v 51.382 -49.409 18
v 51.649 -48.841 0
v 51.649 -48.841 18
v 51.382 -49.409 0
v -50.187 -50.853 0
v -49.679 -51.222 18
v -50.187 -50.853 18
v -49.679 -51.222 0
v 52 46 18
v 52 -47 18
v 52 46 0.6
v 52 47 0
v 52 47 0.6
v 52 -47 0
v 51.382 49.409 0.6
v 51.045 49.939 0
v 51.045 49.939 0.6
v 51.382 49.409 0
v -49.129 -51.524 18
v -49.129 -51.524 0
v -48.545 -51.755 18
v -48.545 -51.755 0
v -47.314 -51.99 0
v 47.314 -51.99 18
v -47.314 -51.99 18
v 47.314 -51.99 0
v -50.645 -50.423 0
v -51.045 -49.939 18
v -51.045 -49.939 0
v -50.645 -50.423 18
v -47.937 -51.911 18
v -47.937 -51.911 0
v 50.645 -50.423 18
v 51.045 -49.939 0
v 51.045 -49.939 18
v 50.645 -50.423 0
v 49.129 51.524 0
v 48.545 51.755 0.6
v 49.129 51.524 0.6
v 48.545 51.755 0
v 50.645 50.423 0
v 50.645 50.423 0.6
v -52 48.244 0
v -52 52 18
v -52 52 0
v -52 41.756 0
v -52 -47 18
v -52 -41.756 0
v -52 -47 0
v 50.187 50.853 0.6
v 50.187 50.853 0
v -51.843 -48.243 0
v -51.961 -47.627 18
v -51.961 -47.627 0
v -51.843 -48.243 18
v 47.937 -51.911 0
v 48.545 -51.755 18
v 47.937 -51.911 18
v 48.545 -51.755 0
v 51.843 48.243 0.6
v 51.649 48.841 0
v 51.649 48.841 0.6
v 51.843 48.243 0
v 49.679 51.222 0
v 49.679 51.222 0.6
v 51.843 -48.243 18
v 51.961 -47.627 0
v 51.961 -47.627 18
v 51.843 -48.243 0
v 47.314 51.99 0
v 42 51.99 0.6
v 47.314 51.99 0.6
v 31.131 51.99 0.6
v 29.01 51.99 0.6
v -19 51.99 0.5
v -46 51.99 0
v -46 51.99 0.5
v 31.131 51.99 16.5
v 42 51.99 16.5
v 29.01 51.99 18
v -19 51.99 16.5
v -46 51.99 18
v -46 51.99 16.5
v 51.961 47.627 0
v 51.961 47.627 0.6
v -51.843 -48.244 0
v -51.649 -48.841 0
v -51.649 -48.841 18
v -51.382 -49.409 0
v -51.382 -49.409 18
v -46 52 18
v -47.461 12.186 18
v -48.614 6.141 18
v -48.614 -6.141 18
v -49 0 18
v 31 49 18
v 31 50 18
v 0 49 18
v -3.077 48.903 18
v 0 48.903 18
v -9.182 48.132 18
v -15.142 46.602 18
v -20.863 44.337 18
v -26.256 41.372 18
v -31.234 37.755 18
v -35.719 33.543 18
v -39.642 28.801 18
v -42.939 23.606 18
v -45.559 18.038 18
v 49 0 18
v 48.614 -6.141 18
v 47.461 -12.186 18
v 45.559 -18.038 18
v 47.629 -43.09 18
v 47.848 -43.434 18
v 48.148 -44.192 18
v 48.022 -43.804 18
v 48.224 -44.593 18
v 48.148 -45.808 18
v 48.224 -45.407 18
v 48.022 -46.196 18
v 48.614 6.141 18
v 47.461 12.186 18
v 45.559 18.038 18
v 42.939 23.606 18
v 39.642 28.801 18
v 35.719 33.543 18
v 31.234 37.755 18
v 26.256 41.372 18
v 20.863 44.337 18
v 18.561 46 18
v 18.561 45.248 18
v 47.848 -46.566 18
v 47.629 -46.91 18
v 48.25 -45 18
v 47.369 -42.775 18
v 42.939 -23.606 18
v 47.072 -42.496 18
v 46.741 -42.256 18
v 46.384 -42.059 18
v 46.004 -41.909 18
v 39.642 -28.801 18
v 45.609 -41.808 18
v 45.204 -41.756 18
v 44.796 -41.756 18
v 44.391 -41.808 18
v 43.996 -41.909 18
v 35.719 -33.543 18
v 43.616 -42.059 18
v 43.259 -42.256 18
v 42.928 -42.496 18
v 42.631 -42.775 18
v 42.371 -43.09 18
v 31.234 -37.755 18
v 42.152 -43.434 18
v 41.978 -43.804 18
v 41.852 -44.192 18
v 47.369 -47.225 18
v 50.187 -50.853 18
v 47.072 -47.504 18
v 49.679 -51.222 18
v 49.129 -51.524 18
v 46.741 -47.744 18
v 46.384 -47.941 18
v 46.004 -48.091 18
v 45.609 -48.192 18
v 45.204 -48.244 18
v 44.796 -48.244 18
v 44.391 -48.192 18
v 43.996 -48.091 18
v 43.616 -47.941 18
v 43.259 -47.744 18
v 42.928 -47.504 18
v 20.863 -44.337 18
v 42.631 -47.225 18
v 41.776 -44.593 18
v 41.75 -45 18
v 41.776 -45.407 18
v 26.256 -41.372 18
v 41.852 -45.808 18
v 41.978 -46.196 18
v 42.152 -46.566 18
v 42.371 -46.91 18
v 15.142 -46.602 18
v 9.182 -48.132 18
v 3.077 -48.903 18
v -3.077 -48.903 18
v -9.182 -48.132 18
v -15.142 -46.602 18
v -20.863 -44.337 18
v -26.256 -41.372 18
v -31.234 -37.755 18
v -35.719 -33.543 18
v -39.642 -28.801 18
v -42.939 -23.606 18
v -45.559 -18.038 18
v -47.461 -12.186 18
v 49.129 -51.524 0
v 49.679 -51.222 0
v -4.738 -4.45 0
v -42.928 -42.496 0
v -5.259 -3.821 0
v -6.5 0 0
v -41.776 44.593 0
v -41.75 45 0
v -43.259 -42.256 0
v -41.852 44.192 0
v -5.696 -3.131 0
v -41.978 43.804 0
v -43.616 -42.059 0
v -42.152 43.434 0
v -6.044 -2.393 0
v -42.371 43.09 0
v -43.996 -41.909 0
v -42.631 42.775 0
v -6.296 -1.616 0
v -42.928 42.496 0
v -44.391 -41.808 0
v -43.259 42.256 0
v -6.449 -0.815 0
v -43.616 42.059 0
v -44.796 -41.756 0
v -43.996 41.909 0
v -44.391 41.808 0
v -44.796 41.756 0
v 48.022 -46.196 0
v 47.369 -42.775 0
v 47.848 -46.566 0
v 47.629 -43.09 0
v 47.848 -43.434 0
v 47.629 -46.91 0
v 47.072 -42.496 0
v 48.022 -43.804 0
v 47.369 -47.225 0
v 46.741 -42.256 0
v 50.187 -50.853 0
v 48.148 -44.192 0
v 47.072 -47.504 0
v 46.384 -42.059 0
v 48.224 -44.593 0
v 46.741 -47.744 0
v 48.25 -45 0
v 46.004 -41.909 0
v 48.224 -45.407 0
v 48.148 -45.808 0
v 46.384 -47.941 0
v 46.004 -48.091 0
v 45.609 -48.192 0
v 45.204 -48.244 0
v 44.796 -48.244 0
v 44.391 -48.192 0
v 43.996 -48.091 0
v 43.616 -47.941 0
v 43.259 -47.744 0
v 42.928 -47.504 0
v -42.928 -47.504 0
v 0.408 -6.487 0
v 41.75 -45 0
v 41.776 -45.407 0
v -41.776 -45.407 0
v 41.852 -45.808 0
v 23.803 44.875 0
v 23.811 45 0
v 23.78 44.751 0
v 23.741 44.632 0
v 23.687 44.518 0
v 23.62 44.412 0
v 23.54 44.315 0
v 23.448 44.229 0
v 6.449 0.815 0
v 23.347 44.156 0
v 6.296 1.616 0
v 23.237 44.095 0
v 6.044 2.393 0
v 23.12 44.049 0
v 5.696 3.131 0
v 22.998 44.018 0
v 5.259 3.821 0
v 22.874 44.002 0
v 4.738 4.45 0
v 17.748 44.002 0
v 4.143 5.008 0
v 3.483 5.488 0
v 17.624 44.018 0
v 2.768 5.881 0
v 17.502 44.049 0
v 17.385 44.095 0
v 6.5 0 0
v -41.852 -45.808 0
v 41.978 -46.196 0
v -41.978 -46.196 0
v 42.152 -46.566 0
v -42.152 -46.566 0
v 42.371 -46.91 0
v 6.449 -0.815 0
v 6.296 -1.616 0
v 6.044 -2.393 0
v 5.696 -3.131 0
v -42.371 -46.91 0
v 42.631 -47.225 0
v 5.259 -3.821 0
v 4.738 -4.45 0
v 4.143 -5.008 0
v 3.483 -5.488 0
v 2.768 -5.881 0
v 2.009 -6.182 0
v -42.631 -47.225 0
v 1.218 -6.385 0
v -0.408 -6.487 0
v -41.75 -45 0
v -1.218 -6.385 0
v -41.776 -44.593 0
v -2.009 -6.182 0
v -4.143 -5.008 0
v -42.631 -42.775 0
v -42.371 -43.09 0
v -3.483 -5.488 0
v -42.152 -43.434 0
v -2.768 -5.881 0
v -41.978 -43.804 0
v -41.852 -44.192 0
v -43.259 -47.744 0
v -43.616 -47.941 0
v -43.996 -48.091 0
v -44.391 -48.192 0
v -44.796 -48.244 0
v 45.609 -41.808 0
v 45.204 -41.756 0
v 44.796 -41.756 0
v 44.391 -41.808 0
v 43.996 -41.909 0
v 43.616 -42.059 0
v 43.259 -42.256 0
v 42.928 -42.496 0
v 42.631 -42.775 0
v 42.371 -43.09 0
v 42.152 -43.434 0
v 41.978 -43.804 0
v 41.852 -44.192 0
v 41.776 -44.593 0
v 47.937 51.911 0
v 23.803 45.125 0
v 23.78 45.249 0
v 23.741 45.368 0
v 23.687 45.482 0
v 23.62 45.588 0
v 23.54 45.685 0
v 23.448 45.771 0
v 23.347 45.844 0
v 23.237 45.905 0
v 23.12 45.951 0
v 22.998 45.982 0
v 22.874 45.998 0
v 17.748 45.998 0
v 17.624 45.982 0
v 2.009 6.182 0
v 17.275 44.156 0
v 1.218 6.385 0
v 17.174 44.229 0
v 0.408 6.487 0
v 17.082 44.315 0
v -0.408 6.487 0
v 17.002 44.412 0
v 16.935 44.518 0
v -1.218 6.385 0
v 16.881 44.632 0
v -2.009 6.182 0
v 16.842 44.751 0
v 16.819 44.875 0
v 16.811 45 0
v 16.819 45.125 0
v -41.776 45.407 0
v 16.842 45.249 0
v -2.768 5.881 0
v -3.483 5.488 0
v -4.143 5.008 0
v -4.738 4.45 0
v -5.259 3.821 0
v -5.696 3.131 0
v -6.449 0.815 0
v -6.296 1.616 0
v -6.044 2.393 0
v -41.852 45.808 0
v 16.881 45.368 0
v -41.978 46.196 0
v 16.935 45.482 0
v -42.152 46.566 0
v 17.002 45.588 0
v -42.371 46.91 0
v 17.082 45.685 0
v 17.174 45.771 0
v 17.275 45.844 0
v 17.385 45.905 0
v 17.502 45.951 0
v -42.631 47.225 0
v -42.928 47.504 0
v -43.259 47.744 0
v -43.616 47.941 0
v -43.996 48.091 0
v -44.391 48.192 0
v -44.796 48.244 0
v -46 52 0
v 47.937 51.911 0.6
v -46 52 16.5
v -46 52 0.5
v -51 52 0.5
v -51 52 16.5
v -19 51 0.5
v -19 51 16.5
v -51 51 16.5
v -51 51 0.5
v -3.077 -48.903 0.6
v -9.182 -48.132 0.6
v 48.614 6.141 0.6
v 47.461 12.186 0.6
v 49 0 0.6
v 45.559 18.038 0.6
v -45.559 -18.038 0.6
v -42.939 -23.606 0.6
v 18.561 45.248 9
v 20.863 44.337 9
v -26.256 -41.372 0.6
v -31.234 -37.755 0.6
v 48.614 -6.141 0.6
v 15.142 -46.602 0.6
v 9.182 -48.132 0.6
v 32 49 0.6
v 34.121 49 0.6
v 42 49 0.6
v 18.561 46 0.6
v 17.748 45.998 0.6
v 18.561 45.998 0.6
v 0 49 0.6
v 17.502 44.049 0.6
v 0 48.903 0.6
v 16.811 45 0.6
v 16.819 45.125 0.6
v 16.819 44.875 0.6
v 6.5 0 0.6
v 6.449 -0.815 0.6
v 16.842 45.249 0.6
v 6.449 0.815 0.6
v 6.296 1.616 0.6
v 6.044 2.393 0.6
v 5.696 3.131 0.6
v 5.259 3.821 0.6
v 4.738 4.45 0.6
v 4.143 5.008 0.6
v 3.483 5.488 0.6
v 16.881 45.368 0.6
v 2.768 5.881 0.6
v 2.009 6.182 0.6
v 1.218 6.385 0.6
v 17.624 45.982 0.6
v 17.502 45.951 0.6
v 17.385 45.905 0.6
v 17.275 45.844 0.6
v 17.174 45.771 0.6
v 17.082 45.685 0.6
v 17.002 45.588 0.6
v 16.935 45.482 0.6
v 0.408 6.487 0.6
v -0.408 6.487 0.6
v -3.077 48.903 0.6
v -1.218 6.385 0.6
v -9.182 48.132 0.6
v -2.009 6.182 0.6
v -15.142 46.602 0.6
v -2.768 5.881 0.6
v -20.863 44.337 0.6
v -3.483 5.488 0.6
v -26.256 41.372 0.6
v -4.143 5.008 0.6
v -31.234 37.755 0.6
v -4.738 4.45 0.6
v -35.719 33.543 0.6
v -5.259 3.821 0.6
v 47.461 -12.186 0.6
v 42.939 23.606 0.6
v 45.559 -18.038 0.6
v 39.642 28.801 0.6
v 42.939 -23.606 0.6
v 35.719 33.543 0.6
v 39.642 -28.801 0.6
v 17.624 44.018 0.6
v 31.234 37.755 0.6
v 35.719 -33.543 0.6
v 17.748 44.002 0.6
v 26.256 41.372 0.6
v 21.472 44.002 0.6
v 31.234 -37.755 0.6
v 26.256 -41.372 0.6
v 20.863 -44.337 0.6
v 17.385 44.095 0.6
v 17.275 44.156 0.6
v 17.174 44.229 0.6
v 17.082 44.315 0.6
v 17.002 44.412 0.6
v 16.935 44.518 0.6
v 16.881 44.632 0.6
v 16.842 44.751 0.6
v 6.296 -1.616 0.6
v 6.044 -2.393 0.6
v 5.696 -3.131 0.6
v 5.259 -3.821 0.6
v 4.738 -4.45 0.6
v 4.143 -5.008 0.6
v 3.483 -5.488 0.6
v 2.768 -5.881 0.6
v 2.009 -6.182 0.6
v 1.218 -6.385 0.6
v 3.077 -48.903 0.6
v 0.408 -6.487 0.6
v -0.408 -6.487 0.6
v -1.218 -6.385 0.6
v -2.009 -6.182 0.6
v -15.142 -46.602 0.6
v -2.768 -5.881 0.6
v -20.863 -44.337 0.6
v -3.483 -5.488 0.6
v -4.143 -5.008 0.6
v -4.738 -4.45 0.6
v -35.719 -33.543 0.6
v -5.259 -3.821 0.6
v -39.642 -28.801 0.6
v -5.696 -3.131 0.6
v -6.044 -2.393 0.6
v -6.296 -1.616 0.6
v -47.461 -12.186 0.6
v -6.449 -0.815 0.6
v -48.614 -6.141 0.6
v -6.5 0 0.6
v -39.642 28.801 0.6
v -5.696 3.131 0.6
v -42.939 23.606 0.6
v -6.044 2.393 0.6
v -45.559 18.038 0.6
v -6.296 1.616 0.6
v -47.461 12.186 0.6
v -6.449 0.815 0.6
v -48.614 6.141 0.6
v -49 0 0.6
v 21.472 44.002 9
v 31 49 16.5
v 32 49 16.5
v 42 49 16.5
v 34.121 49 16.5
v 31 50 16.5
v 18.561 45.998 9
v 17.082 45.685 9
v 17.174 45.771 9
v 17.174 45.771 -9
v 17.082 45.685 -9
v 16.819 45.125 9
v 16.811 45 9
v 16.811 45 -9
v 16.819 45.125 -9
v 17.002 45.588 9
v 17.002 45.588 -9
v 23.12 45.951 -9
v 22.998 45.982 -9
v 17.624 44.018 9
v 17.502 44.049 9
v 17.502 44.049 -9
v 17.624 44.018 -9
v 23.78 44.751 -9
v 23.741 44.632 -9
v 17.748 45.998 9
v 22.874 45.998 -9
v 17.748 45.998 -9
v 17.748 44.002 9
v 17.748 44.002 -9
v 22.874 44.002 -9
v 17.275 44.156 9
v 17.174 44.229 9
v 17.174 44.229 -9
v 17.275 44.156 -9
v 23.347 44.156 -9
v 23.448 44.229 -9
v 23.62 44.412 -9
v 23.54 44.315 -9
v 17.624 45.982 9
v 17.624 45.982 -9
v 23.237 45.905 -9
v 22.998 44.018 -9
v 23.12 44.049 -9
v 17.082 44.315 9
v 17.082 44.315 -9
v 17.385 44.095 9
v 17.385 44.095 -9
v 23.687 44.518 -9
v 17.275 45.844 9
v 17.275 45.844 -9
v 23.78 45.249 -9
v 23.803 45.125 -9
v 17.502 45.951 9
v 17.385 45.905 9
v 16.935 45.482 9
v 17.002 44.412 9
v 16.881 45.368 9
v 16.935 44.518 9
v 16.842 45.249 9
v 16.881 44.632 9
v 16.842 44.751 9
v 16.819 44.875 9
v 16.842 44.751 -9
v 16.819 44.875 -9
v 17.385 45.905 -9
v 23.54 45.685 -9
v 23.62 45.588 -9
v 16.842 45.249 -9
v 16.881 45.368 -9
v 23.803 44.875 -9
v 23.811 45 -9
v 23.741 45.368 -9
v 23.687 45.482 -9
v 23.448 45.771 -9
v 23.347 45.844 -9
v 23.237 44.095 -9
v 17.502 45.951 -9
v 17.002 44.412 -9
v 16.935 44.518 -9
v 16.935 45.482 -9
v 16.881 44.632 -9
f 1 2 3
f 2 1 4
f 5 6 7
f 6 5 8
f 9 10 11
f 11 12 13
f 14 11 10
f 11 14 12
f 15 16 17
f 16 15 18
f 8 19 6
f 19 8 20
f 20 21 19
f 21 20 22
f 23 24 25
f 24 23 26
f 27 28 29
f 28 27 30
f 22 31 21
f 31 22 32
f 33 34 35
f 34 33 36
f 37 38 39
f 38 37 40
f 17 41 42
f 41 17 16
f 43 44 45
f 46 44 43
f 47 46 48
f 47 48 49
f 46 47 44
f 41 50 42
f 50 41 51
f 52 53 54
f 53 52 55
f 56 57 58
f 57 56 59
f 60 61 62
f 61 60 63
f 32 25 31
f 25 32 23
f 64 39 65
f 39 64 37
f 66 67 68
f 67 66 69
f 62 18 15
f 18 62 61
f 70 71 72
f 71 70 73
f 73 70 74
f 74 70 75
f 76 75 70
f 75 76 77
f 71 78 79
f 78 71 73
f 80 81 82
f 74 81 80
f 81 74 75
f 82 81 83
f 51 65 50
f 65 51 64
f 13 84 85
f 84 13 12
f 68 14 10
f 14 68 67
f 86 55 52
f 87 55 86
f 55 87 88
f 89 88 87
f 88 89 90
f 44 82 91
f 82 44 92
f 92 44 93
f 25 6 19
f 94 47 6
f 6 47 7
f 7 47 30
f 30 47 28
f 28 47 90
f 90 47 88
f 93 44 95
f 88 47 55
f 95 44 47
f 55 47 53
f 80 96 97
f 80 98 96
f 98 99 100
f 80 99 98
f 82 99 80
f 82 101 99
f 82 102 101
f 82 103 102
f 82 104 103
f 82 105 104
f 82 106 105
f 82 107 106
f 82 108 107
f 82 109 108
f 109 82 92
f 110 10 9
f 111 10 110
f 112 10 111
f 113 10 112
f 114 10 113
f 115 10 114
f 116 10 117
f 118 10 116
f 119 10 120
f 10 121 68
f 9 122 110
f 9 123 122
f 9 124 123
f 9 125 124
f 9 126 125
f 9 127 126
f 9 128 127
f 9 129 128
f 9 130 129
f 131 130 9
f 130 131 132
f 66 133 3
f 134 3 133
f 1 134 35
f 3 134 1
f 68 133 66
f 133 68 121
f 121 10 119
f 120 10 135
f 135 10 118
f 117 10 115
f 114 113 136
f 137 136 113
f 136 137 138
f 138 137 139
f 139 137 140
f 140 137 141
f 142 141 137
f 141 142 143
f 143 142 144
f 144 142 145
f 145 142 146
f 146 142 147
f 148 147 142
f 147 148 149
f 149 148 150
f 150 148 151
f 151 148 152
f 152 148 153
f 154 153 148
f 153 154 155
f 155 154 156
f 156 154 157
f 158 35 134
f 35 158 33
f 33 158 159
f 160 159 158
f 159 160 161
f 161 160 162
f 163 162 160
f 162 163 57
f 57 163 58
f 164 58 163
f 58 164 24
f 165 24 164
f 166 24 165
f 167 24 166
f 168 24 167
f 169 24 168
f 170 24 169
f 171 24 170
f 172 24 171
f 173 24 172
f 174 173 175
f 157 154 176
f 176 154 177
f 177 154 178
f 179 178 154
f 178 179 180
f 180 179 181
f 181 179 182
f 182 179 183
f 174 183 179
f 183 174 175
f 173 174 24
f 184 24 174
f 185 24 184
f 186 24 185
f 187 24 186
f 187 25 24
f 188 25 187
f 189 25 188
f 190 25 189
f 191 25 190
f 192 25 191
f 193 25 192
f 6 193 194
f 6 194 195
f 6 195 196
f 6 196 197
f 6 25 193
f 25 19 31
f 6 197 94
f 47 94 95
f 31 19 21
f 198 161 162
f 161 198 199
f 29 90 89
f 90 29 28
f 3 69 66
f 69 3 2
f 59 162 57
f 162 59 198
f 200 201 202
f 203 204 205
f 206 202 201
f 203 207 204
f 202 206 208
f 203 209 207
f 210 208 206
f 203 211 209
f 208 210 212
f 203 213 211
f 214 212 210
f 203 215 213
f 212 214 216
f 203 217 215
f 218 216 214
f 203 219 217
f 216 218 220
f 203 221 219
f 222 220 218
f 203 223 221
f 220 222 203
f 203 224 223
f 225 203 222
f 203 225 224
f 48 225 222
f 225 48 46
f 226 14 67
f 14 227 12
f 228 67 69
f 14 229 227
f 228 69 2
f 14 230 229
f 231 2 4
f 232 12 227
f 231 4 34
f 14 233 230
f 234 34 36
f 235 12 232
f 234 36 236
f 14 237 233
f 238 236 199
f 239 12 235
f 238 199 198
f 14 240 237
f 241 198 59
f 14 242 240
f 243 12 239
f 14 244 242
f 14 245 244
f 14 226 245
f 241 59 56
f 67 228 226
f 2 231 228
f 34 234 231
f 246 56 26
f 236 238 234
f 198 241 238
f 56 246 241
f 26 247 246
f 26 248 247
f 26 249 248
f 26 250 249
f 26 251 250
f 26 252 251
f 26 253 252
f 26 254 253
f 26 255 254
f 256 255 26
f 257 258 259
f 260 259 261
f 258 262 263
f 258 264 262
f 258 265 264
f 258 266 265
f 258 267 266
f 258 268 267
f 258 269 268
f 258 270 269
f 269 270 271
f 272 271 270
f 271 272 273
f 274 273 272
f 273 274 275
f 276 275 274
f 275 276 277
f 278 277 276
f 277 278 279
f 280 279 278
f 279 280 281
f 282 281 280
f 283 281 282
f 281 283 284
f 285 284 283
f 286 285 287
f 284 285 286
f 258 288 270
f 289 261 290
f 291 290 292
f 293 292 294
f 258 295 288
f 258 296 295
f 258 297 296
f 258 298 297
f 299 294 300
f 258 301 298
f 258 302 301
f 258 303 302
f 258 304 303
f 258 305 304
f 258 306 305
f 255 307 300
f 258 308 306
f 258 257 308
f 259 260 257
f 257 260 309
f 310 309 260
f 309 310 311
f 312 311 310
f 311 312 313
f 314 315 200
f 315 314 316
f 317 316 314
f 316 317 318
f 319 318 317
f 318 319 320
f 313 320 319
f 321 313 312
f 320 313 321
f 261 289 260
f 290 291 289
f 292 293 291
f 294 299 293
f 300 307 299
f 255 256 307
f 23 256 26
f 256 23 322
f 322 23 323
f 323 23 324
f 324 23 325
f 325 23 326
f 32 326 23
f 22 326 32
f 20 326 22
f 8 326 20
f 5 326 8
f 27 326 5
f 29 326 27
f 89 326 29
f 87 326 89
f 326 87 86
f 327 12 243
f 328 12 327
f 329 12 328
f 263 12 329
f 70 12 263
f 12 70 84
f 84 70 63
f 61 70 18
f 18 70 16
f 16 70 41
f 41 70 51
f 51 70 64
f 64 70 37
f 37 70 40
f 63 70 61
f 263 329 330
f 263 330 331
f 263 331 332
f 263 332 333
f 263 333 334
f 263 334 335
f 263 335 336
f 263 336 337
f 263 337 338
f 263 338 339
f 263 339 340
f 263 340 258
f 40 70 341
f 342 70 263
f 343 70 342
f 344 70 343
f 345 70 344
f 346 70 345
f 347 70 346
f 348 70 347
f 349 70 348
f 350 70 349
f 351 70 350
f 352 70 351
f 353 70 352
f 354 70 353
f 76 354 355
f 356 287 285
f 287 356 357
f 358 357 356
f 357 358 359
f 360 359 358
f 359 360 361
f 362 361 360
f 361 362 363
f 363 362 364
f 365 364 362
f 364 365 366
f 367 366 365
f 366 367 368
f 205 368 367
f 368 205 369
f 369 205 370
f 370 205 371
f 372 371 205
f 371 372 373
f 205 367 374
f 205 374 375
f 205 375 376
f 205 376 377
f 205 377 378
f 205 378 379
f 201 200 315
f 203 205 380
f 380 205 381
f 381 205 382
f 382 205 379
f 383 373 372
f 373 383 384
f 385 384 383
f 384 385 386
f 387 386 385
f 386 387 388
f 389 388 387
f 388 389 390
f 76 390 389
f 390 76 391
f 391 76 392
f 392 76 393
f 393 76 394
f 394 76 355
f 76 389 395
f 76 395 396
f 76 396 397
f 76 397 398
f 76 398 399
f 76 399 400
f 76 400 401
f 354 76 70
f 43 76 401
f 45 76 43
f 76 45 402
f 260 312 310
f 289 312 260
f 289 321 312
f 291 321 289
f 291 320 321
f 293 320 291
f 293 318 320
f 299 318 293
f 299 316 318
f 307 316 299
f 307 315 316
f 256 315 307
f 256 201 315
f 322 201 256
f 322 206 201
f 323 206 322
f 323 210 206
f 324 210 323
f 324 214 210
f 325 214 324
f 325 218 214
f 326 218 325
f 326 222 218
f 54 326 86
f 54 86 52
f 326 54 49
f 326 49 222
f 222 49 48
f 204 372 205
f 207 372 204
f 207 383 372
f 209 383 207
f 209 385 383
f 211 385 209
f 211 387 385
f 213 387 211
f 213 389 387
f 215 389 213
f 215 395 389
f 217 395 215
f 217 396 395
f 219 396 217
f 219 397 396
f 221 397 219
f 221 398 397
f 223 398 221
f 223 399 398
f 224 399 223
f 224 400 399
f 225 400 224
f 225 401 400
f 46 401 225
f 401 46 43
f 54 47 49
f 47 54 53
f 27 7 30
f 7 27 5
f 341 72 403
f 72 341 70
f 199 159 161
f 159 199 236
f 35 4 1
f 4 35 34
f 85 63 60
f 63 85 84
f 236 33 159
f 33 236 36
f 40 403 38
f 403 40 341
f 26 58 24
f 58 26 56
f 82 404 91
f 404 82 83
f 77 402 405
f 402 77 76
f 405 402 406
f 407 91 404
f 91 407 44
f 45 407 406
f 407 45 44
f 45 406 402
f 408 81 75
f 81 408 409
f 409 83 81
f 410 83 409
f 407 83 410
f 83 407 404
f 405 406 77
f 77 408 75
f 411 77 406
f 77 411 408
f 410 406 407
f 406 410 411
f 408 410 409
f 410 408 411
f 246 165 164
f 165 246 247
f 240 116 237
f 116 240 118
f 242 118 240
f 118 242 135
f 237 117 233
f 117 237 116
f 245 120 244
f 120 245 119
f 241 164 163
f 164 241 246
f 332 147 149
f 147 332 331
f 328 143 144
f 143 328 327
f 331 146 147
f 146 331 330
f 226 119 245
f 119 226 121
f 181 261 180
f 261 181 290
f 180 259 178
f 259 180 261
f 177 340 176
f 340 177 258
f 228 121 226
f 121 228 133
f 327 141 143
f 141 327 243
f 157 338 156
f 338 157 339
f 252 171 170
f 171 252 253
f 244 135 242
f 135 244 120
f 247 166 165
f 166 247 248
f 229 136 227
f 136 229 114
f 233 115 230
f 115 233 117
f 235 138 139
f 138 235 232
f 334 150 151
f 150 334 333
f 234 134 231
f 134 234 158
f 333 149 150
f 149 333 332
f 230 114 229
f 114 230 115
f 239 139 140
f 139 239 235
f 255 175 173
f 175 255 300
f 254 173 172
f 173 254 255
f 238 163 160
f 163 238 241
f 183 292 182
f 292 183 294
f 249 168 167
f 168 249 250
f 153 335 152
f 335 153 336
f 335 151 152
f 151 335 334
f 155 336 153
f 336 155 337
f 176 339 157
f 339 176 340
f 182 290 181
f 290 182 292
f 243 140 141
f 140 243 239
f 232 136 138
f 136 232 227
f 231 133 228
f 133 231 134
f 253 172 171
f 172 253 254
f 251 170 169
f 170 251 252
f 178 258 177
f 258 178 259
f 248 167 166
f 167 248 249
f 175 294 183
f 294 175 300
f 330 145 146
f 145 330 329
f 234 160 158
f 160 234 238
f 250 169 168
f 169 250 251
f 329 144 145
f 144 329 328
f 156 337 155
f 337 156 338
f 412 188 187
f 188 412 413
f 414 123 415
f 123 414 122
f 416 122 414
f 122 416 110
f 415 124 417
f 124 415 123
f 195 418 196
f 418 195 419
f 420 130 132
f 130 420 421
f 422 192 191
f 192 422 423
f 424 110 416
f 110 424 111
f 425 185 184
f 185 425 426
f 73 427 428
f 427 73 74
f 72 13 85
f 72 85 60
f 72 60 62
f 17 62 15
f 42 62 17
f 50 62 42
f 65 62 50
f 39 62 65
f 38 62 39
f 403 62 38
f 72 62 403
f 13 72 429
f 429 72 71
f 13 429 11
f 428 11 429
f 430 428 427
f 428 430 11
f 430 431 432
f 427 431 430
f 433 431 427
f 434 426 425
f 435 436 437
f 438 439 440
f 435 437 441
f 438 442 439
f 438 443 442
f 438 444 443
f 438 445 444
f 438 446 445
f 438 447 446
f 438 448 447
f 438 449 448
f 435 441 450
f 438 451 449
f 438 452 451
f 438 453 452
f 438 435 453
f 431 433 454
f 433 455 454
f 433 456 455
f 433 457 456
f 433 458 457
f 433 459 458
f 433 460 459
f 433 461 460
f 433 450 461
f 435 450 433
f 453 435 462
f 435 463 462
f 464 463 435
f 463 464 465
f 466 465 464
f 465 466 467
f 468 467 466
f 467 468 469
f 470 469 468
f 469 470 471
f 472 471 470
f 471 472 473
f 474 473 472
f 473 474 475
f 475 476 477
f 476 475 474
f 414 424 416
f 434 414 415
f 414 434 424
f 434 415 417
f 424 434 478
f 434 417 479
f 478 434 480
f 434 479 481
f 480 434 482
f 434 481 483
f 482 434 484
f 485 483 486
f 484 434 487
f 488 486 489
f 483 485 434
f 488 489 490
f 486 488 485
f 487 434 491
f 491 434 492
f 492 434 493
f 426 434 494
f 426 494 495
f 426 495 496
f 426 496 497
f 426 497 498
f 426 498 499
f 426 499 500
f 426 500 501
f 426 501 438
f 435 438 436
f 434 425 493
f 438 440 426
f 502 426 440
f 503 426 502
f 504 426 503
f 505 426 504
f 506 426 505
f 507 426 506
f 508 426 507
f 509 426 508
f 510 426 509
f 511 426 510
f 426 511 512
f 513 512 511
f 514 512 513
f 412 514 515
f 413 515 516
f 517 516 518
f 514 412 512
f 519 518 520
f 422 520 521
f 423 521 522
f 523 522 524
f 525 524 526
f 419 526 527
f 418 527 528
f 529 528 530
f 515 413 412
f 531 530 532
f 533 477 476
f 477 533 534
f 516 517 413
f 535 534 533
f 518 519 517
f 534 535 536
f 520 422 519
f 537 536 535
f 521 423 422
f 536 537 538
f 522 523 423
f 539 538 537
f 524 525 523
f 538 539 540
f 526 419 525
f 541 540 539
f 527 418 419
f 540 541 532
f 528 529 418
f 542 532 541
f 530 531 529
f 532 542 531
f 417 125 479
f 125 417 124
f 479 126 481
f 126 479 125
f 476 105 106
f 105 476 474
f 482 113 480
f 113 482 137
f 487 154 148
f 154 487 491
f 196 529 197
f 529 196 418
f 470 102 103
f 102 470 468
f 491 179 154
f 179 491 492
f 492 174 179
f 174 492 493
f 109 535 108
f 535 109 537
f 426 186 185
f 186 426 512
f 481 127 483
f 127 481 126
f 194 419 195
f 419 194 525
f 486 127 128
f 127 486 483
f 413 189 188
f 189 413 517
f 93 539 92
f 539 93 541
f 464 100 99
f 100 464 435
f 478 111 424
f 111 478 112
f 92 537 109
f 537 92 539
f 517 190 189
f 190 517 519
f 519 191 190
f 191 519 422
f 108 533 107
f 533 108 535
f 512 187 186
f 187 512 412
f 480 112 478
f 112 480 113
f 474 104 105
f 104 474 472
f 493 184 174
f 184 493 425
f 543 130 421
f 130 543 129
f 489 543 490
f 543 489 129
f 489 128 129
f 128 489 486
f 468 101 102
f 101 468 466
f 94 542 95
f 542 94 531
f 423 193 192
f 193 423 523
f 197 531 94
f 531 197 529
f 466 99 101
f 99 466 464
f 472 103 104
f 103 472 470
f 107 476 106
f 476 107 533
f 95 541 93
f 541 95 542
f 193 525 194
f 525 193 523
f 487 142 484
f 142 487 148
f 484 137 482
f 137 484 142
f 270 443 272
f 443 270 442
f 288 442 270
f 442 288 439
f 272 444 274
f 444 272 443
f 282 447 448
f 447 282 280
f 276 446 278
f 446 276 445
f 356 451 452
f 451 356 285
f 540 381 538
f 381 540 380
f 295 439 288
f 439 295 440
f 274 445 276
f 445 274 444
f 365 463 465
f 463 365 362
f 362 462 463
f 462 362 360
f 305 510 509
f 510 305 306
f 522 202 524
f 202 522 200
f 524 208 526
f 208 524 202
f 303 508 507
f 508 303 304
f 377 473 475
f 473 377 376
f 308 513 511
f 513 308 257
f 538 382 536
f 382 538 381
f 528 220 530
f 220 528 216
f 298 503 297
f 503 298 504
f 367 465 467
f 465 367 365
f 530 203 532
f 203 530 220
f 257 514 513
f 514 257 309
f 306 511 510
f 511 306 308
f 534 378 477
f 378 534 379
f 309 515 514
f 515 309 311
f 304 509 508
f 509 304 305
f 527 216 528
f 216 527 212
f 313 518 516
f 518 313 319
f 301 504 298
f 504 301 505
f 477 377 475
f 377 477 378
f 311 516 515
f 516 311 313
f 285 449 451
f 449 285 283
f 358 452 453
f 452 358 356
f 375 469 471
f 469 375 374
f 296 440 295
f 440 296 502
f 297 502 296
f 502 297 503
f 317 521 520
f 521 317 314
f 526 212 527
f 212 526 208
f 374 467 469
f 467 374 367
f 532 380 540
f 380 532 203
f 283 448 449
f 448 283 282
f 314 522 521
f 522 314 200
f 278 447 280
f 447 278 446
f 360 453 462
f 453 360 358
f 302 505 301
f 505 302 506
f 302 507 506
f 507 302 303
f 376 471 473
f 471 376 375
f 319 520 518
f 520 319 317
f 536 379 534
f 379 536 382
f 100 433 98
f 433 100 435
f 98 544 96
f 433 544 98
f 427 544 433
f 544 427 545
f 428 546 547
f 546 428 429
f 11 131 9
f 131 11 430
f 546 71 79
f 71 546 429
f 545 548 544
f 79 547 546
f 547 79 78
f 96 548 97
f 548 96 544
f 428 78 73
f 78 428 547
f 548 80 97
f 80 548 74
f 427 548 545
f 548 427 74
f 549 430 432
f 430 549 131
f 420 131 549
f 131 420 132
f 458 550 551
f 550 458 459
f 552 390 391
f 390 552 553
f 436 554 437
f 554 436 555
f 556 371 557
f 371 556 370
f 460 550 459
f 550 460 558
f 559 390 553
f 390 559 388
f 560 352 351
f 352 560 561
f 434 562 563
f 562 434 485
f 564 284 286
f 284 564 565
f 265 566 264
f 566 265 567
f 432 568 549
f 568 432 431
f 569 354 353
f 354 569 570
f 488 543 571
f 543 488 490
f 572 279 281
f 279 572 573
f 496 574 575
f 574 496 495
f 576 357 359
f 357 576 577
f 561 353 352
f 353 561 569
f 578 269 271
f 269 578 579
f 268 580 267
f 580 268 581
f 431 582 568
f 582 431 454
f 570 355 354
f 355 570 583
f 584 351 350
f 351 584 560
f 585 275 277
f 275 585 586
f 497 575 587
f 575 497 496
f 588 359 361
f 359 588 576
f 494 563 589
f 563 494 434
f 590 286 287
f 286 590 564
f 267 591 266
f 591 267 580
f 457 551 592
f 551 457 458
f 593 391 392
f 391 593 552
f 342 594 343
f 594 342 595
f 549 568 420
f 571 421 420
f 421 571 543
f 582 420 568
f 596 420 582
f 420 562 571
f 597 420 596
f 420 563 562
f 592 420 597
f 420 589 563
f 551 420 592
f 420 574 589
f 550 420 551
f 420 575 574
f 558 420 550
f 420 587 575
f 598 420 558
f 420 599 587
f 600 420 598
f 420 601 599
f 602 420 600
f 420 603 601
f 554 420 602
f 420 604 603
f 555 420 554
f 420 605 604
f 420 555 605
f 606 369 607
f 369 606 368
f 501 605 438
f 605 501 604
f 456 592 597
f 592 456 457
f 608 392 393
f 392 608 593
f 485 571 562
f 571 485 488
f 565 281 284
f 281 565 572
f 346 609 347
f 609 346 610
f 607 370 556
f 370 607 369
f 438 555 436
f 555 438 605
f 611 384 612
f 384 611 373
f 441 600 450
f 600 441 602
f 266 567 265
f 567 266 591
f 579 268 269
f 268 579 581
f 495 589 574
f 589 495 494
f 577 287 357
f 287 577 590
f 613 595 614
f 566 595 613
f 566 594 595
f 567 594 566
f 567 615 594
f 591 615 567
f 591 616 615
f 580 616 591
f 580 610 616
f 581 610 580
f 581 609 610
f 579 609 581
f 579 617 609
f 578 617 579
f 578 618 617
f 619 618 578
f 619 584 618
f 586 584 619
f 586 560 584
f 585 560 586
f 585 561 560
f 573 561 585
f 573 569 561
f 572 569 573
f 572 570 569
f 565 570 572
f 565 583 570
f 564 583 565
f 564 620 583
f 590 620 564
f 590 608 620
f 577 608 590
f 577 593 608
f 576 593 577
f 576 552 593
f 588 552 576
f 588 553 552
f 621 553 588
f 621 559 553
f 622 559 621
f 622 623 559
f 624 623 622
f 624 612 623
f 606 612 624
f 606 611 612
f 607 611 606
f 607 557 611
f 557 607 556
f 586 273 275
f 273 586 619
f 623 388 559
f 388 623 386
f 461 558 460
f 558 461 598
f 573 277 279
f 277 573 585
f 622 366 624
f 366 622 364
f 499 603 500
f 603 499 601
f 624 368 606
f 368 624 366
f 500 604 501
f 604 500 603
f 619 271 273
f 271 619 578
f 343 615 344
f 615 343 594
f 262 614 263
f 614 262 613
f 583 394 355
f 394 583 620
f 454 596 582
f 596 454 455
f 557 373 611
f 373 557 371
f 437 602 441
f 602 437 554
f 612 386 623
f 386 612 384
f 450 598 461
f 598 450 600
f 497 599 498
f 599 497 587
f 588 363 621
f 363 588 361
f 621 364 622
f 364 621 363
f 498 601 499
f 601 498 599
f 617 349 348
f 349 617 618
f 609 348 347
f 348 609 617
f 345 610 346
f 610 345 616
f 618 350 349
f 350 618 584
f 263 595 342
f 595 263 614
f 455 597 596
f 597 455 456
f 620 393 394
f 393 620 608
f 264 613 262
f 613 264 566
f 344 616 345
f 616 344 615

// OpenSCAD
$fn = 50;


union() {
	difference() {
		union() {
			hull() {
				translate(v = [-47.0000000000, 47.0000000000, 0]) {
					cylinder(h = 18, r = 5);
				}
				translate(v = [47.0000000000, 47.0000000000, 0]) {
					cylinder(h = 18, r = 5);
				}
				translate(v = [-47.0000000000, -47.0000000000, 0]) {
					cylinder(h = 18, r = 5);
				}
				translate(v = [47.0000000000, -47.0000000000, 0]) {
					cylinder(h = 18, r = 5);
				}
			}
			translate(v = [-52.0000000000, 46.0000000000, 0]) {
				cube(size = [6, 6, 18]);
			}
		}
		union() {
			translate(v = [-52.5000000000, -45.0000000000, -250.0000000000]) {
				rotate(a = [0, 0, 0]) {
					difference() {
						union() {
							hull() {
								translate(v = [7.5000000000, 0, 0]) {
									cylinder(h = 250, r = 3.2500000000, r1 = 3.2500000000, r2 = 3.2500000000);
								}
								translate(v = [-7.5000000000, 0, 0]) {
									cylinder(h = 250, r = 3.2500000000, r1 = 3.2500000000, r2 = 3.2500000000);
								}
							}
						}
						union();
					}
				}
			}
			translate(v = [-52.5000000000, 45.0000000000, -250.0000000000]) {
				rotate(a = [0, 0, 0]) {
					difference() {
						union() {
							hull() {
								translate(v = [7.5000000000, 0, 0]) {
									cylinder(h = 250, r = 3.2500000000, r1 = 3.2500000000, r2 = 3.2500000000);
								}
								translate(v = [-7.5000000000, 0, 0]) {
									cylinder(h = 250, r = 3.2500000000, r1 = 3.2500000000, r2 = 3.2500000000);
								}
							}
						}
						union();
					}
				}
			}
			translate(v = [-51.0000000000, 51.0000000000, 0.5000000000]) {
				cube(size = [32, 1, 16]);
			}
			translate(v = [45.0000000000, -45.0000000000, 0]) {
				cylinder(h = 100, r = 3.2500000000);
			}
			translate(v = [0, 0, 0.6000000000]) {
				cylinder(h = 20.4000000000, r = 49.0000000000);
			}
			translate(v = [0, 0, -9.0000000000]) {
				cylinder(h = 18, r = 6.5000000000);
			}
			translate(v = [0.0000000000, 46.0000000000, 0.6000000000]) {
				cube(size = [52.0000000000, 3, 20.4000000000]);
			}
			translate(v = [42.0000000000, 46.0000000000, 0.6000000000]) {
				cube(size = [10, 6, 20.4000000000]);
			}
			translate(v = [31.0000000000, 46.0000000000, 16.5000000000]) {
				cube(size = [21, 6, 1.5000000000]);
			}
			translate(v = [28.2500000000, 52.7500000000, 0.6000000000]) {
				rotate(a = [0, 0, -45]) {
					cube(size = [7.5000000000, 1.5000000000, 20.4000000000]);
				}
			}
			translate(v = [11.0610000000, 44.0000000000, 0.6000000000]) {
				cube(size = [7.5000000000, 2, 17.4000000000]);
			}
		}
	}
	union() {
		translate(v = [20.3110000000, 45.0000000000, -9.0000000000]) {
			rotate(a = [0, 0, 0]) {
				difference() {
					union() {
						#hull() {
							#translate(v = [2.5000000000, 0, 0]) {
								cylinder(h = 18, r = 1.0000000000, r1 = 1.0000000000, r2 = 1.0000000000);
							}
							#translate(v = [-2.5000000000, 0, 0]) {
								cylinder(h = 18, r = 1.0000000000, r1 = 1.0000000000, r2 = 1.0000000000);
							}
						}
					}
					union();
				}
			}
		}
	}
}
